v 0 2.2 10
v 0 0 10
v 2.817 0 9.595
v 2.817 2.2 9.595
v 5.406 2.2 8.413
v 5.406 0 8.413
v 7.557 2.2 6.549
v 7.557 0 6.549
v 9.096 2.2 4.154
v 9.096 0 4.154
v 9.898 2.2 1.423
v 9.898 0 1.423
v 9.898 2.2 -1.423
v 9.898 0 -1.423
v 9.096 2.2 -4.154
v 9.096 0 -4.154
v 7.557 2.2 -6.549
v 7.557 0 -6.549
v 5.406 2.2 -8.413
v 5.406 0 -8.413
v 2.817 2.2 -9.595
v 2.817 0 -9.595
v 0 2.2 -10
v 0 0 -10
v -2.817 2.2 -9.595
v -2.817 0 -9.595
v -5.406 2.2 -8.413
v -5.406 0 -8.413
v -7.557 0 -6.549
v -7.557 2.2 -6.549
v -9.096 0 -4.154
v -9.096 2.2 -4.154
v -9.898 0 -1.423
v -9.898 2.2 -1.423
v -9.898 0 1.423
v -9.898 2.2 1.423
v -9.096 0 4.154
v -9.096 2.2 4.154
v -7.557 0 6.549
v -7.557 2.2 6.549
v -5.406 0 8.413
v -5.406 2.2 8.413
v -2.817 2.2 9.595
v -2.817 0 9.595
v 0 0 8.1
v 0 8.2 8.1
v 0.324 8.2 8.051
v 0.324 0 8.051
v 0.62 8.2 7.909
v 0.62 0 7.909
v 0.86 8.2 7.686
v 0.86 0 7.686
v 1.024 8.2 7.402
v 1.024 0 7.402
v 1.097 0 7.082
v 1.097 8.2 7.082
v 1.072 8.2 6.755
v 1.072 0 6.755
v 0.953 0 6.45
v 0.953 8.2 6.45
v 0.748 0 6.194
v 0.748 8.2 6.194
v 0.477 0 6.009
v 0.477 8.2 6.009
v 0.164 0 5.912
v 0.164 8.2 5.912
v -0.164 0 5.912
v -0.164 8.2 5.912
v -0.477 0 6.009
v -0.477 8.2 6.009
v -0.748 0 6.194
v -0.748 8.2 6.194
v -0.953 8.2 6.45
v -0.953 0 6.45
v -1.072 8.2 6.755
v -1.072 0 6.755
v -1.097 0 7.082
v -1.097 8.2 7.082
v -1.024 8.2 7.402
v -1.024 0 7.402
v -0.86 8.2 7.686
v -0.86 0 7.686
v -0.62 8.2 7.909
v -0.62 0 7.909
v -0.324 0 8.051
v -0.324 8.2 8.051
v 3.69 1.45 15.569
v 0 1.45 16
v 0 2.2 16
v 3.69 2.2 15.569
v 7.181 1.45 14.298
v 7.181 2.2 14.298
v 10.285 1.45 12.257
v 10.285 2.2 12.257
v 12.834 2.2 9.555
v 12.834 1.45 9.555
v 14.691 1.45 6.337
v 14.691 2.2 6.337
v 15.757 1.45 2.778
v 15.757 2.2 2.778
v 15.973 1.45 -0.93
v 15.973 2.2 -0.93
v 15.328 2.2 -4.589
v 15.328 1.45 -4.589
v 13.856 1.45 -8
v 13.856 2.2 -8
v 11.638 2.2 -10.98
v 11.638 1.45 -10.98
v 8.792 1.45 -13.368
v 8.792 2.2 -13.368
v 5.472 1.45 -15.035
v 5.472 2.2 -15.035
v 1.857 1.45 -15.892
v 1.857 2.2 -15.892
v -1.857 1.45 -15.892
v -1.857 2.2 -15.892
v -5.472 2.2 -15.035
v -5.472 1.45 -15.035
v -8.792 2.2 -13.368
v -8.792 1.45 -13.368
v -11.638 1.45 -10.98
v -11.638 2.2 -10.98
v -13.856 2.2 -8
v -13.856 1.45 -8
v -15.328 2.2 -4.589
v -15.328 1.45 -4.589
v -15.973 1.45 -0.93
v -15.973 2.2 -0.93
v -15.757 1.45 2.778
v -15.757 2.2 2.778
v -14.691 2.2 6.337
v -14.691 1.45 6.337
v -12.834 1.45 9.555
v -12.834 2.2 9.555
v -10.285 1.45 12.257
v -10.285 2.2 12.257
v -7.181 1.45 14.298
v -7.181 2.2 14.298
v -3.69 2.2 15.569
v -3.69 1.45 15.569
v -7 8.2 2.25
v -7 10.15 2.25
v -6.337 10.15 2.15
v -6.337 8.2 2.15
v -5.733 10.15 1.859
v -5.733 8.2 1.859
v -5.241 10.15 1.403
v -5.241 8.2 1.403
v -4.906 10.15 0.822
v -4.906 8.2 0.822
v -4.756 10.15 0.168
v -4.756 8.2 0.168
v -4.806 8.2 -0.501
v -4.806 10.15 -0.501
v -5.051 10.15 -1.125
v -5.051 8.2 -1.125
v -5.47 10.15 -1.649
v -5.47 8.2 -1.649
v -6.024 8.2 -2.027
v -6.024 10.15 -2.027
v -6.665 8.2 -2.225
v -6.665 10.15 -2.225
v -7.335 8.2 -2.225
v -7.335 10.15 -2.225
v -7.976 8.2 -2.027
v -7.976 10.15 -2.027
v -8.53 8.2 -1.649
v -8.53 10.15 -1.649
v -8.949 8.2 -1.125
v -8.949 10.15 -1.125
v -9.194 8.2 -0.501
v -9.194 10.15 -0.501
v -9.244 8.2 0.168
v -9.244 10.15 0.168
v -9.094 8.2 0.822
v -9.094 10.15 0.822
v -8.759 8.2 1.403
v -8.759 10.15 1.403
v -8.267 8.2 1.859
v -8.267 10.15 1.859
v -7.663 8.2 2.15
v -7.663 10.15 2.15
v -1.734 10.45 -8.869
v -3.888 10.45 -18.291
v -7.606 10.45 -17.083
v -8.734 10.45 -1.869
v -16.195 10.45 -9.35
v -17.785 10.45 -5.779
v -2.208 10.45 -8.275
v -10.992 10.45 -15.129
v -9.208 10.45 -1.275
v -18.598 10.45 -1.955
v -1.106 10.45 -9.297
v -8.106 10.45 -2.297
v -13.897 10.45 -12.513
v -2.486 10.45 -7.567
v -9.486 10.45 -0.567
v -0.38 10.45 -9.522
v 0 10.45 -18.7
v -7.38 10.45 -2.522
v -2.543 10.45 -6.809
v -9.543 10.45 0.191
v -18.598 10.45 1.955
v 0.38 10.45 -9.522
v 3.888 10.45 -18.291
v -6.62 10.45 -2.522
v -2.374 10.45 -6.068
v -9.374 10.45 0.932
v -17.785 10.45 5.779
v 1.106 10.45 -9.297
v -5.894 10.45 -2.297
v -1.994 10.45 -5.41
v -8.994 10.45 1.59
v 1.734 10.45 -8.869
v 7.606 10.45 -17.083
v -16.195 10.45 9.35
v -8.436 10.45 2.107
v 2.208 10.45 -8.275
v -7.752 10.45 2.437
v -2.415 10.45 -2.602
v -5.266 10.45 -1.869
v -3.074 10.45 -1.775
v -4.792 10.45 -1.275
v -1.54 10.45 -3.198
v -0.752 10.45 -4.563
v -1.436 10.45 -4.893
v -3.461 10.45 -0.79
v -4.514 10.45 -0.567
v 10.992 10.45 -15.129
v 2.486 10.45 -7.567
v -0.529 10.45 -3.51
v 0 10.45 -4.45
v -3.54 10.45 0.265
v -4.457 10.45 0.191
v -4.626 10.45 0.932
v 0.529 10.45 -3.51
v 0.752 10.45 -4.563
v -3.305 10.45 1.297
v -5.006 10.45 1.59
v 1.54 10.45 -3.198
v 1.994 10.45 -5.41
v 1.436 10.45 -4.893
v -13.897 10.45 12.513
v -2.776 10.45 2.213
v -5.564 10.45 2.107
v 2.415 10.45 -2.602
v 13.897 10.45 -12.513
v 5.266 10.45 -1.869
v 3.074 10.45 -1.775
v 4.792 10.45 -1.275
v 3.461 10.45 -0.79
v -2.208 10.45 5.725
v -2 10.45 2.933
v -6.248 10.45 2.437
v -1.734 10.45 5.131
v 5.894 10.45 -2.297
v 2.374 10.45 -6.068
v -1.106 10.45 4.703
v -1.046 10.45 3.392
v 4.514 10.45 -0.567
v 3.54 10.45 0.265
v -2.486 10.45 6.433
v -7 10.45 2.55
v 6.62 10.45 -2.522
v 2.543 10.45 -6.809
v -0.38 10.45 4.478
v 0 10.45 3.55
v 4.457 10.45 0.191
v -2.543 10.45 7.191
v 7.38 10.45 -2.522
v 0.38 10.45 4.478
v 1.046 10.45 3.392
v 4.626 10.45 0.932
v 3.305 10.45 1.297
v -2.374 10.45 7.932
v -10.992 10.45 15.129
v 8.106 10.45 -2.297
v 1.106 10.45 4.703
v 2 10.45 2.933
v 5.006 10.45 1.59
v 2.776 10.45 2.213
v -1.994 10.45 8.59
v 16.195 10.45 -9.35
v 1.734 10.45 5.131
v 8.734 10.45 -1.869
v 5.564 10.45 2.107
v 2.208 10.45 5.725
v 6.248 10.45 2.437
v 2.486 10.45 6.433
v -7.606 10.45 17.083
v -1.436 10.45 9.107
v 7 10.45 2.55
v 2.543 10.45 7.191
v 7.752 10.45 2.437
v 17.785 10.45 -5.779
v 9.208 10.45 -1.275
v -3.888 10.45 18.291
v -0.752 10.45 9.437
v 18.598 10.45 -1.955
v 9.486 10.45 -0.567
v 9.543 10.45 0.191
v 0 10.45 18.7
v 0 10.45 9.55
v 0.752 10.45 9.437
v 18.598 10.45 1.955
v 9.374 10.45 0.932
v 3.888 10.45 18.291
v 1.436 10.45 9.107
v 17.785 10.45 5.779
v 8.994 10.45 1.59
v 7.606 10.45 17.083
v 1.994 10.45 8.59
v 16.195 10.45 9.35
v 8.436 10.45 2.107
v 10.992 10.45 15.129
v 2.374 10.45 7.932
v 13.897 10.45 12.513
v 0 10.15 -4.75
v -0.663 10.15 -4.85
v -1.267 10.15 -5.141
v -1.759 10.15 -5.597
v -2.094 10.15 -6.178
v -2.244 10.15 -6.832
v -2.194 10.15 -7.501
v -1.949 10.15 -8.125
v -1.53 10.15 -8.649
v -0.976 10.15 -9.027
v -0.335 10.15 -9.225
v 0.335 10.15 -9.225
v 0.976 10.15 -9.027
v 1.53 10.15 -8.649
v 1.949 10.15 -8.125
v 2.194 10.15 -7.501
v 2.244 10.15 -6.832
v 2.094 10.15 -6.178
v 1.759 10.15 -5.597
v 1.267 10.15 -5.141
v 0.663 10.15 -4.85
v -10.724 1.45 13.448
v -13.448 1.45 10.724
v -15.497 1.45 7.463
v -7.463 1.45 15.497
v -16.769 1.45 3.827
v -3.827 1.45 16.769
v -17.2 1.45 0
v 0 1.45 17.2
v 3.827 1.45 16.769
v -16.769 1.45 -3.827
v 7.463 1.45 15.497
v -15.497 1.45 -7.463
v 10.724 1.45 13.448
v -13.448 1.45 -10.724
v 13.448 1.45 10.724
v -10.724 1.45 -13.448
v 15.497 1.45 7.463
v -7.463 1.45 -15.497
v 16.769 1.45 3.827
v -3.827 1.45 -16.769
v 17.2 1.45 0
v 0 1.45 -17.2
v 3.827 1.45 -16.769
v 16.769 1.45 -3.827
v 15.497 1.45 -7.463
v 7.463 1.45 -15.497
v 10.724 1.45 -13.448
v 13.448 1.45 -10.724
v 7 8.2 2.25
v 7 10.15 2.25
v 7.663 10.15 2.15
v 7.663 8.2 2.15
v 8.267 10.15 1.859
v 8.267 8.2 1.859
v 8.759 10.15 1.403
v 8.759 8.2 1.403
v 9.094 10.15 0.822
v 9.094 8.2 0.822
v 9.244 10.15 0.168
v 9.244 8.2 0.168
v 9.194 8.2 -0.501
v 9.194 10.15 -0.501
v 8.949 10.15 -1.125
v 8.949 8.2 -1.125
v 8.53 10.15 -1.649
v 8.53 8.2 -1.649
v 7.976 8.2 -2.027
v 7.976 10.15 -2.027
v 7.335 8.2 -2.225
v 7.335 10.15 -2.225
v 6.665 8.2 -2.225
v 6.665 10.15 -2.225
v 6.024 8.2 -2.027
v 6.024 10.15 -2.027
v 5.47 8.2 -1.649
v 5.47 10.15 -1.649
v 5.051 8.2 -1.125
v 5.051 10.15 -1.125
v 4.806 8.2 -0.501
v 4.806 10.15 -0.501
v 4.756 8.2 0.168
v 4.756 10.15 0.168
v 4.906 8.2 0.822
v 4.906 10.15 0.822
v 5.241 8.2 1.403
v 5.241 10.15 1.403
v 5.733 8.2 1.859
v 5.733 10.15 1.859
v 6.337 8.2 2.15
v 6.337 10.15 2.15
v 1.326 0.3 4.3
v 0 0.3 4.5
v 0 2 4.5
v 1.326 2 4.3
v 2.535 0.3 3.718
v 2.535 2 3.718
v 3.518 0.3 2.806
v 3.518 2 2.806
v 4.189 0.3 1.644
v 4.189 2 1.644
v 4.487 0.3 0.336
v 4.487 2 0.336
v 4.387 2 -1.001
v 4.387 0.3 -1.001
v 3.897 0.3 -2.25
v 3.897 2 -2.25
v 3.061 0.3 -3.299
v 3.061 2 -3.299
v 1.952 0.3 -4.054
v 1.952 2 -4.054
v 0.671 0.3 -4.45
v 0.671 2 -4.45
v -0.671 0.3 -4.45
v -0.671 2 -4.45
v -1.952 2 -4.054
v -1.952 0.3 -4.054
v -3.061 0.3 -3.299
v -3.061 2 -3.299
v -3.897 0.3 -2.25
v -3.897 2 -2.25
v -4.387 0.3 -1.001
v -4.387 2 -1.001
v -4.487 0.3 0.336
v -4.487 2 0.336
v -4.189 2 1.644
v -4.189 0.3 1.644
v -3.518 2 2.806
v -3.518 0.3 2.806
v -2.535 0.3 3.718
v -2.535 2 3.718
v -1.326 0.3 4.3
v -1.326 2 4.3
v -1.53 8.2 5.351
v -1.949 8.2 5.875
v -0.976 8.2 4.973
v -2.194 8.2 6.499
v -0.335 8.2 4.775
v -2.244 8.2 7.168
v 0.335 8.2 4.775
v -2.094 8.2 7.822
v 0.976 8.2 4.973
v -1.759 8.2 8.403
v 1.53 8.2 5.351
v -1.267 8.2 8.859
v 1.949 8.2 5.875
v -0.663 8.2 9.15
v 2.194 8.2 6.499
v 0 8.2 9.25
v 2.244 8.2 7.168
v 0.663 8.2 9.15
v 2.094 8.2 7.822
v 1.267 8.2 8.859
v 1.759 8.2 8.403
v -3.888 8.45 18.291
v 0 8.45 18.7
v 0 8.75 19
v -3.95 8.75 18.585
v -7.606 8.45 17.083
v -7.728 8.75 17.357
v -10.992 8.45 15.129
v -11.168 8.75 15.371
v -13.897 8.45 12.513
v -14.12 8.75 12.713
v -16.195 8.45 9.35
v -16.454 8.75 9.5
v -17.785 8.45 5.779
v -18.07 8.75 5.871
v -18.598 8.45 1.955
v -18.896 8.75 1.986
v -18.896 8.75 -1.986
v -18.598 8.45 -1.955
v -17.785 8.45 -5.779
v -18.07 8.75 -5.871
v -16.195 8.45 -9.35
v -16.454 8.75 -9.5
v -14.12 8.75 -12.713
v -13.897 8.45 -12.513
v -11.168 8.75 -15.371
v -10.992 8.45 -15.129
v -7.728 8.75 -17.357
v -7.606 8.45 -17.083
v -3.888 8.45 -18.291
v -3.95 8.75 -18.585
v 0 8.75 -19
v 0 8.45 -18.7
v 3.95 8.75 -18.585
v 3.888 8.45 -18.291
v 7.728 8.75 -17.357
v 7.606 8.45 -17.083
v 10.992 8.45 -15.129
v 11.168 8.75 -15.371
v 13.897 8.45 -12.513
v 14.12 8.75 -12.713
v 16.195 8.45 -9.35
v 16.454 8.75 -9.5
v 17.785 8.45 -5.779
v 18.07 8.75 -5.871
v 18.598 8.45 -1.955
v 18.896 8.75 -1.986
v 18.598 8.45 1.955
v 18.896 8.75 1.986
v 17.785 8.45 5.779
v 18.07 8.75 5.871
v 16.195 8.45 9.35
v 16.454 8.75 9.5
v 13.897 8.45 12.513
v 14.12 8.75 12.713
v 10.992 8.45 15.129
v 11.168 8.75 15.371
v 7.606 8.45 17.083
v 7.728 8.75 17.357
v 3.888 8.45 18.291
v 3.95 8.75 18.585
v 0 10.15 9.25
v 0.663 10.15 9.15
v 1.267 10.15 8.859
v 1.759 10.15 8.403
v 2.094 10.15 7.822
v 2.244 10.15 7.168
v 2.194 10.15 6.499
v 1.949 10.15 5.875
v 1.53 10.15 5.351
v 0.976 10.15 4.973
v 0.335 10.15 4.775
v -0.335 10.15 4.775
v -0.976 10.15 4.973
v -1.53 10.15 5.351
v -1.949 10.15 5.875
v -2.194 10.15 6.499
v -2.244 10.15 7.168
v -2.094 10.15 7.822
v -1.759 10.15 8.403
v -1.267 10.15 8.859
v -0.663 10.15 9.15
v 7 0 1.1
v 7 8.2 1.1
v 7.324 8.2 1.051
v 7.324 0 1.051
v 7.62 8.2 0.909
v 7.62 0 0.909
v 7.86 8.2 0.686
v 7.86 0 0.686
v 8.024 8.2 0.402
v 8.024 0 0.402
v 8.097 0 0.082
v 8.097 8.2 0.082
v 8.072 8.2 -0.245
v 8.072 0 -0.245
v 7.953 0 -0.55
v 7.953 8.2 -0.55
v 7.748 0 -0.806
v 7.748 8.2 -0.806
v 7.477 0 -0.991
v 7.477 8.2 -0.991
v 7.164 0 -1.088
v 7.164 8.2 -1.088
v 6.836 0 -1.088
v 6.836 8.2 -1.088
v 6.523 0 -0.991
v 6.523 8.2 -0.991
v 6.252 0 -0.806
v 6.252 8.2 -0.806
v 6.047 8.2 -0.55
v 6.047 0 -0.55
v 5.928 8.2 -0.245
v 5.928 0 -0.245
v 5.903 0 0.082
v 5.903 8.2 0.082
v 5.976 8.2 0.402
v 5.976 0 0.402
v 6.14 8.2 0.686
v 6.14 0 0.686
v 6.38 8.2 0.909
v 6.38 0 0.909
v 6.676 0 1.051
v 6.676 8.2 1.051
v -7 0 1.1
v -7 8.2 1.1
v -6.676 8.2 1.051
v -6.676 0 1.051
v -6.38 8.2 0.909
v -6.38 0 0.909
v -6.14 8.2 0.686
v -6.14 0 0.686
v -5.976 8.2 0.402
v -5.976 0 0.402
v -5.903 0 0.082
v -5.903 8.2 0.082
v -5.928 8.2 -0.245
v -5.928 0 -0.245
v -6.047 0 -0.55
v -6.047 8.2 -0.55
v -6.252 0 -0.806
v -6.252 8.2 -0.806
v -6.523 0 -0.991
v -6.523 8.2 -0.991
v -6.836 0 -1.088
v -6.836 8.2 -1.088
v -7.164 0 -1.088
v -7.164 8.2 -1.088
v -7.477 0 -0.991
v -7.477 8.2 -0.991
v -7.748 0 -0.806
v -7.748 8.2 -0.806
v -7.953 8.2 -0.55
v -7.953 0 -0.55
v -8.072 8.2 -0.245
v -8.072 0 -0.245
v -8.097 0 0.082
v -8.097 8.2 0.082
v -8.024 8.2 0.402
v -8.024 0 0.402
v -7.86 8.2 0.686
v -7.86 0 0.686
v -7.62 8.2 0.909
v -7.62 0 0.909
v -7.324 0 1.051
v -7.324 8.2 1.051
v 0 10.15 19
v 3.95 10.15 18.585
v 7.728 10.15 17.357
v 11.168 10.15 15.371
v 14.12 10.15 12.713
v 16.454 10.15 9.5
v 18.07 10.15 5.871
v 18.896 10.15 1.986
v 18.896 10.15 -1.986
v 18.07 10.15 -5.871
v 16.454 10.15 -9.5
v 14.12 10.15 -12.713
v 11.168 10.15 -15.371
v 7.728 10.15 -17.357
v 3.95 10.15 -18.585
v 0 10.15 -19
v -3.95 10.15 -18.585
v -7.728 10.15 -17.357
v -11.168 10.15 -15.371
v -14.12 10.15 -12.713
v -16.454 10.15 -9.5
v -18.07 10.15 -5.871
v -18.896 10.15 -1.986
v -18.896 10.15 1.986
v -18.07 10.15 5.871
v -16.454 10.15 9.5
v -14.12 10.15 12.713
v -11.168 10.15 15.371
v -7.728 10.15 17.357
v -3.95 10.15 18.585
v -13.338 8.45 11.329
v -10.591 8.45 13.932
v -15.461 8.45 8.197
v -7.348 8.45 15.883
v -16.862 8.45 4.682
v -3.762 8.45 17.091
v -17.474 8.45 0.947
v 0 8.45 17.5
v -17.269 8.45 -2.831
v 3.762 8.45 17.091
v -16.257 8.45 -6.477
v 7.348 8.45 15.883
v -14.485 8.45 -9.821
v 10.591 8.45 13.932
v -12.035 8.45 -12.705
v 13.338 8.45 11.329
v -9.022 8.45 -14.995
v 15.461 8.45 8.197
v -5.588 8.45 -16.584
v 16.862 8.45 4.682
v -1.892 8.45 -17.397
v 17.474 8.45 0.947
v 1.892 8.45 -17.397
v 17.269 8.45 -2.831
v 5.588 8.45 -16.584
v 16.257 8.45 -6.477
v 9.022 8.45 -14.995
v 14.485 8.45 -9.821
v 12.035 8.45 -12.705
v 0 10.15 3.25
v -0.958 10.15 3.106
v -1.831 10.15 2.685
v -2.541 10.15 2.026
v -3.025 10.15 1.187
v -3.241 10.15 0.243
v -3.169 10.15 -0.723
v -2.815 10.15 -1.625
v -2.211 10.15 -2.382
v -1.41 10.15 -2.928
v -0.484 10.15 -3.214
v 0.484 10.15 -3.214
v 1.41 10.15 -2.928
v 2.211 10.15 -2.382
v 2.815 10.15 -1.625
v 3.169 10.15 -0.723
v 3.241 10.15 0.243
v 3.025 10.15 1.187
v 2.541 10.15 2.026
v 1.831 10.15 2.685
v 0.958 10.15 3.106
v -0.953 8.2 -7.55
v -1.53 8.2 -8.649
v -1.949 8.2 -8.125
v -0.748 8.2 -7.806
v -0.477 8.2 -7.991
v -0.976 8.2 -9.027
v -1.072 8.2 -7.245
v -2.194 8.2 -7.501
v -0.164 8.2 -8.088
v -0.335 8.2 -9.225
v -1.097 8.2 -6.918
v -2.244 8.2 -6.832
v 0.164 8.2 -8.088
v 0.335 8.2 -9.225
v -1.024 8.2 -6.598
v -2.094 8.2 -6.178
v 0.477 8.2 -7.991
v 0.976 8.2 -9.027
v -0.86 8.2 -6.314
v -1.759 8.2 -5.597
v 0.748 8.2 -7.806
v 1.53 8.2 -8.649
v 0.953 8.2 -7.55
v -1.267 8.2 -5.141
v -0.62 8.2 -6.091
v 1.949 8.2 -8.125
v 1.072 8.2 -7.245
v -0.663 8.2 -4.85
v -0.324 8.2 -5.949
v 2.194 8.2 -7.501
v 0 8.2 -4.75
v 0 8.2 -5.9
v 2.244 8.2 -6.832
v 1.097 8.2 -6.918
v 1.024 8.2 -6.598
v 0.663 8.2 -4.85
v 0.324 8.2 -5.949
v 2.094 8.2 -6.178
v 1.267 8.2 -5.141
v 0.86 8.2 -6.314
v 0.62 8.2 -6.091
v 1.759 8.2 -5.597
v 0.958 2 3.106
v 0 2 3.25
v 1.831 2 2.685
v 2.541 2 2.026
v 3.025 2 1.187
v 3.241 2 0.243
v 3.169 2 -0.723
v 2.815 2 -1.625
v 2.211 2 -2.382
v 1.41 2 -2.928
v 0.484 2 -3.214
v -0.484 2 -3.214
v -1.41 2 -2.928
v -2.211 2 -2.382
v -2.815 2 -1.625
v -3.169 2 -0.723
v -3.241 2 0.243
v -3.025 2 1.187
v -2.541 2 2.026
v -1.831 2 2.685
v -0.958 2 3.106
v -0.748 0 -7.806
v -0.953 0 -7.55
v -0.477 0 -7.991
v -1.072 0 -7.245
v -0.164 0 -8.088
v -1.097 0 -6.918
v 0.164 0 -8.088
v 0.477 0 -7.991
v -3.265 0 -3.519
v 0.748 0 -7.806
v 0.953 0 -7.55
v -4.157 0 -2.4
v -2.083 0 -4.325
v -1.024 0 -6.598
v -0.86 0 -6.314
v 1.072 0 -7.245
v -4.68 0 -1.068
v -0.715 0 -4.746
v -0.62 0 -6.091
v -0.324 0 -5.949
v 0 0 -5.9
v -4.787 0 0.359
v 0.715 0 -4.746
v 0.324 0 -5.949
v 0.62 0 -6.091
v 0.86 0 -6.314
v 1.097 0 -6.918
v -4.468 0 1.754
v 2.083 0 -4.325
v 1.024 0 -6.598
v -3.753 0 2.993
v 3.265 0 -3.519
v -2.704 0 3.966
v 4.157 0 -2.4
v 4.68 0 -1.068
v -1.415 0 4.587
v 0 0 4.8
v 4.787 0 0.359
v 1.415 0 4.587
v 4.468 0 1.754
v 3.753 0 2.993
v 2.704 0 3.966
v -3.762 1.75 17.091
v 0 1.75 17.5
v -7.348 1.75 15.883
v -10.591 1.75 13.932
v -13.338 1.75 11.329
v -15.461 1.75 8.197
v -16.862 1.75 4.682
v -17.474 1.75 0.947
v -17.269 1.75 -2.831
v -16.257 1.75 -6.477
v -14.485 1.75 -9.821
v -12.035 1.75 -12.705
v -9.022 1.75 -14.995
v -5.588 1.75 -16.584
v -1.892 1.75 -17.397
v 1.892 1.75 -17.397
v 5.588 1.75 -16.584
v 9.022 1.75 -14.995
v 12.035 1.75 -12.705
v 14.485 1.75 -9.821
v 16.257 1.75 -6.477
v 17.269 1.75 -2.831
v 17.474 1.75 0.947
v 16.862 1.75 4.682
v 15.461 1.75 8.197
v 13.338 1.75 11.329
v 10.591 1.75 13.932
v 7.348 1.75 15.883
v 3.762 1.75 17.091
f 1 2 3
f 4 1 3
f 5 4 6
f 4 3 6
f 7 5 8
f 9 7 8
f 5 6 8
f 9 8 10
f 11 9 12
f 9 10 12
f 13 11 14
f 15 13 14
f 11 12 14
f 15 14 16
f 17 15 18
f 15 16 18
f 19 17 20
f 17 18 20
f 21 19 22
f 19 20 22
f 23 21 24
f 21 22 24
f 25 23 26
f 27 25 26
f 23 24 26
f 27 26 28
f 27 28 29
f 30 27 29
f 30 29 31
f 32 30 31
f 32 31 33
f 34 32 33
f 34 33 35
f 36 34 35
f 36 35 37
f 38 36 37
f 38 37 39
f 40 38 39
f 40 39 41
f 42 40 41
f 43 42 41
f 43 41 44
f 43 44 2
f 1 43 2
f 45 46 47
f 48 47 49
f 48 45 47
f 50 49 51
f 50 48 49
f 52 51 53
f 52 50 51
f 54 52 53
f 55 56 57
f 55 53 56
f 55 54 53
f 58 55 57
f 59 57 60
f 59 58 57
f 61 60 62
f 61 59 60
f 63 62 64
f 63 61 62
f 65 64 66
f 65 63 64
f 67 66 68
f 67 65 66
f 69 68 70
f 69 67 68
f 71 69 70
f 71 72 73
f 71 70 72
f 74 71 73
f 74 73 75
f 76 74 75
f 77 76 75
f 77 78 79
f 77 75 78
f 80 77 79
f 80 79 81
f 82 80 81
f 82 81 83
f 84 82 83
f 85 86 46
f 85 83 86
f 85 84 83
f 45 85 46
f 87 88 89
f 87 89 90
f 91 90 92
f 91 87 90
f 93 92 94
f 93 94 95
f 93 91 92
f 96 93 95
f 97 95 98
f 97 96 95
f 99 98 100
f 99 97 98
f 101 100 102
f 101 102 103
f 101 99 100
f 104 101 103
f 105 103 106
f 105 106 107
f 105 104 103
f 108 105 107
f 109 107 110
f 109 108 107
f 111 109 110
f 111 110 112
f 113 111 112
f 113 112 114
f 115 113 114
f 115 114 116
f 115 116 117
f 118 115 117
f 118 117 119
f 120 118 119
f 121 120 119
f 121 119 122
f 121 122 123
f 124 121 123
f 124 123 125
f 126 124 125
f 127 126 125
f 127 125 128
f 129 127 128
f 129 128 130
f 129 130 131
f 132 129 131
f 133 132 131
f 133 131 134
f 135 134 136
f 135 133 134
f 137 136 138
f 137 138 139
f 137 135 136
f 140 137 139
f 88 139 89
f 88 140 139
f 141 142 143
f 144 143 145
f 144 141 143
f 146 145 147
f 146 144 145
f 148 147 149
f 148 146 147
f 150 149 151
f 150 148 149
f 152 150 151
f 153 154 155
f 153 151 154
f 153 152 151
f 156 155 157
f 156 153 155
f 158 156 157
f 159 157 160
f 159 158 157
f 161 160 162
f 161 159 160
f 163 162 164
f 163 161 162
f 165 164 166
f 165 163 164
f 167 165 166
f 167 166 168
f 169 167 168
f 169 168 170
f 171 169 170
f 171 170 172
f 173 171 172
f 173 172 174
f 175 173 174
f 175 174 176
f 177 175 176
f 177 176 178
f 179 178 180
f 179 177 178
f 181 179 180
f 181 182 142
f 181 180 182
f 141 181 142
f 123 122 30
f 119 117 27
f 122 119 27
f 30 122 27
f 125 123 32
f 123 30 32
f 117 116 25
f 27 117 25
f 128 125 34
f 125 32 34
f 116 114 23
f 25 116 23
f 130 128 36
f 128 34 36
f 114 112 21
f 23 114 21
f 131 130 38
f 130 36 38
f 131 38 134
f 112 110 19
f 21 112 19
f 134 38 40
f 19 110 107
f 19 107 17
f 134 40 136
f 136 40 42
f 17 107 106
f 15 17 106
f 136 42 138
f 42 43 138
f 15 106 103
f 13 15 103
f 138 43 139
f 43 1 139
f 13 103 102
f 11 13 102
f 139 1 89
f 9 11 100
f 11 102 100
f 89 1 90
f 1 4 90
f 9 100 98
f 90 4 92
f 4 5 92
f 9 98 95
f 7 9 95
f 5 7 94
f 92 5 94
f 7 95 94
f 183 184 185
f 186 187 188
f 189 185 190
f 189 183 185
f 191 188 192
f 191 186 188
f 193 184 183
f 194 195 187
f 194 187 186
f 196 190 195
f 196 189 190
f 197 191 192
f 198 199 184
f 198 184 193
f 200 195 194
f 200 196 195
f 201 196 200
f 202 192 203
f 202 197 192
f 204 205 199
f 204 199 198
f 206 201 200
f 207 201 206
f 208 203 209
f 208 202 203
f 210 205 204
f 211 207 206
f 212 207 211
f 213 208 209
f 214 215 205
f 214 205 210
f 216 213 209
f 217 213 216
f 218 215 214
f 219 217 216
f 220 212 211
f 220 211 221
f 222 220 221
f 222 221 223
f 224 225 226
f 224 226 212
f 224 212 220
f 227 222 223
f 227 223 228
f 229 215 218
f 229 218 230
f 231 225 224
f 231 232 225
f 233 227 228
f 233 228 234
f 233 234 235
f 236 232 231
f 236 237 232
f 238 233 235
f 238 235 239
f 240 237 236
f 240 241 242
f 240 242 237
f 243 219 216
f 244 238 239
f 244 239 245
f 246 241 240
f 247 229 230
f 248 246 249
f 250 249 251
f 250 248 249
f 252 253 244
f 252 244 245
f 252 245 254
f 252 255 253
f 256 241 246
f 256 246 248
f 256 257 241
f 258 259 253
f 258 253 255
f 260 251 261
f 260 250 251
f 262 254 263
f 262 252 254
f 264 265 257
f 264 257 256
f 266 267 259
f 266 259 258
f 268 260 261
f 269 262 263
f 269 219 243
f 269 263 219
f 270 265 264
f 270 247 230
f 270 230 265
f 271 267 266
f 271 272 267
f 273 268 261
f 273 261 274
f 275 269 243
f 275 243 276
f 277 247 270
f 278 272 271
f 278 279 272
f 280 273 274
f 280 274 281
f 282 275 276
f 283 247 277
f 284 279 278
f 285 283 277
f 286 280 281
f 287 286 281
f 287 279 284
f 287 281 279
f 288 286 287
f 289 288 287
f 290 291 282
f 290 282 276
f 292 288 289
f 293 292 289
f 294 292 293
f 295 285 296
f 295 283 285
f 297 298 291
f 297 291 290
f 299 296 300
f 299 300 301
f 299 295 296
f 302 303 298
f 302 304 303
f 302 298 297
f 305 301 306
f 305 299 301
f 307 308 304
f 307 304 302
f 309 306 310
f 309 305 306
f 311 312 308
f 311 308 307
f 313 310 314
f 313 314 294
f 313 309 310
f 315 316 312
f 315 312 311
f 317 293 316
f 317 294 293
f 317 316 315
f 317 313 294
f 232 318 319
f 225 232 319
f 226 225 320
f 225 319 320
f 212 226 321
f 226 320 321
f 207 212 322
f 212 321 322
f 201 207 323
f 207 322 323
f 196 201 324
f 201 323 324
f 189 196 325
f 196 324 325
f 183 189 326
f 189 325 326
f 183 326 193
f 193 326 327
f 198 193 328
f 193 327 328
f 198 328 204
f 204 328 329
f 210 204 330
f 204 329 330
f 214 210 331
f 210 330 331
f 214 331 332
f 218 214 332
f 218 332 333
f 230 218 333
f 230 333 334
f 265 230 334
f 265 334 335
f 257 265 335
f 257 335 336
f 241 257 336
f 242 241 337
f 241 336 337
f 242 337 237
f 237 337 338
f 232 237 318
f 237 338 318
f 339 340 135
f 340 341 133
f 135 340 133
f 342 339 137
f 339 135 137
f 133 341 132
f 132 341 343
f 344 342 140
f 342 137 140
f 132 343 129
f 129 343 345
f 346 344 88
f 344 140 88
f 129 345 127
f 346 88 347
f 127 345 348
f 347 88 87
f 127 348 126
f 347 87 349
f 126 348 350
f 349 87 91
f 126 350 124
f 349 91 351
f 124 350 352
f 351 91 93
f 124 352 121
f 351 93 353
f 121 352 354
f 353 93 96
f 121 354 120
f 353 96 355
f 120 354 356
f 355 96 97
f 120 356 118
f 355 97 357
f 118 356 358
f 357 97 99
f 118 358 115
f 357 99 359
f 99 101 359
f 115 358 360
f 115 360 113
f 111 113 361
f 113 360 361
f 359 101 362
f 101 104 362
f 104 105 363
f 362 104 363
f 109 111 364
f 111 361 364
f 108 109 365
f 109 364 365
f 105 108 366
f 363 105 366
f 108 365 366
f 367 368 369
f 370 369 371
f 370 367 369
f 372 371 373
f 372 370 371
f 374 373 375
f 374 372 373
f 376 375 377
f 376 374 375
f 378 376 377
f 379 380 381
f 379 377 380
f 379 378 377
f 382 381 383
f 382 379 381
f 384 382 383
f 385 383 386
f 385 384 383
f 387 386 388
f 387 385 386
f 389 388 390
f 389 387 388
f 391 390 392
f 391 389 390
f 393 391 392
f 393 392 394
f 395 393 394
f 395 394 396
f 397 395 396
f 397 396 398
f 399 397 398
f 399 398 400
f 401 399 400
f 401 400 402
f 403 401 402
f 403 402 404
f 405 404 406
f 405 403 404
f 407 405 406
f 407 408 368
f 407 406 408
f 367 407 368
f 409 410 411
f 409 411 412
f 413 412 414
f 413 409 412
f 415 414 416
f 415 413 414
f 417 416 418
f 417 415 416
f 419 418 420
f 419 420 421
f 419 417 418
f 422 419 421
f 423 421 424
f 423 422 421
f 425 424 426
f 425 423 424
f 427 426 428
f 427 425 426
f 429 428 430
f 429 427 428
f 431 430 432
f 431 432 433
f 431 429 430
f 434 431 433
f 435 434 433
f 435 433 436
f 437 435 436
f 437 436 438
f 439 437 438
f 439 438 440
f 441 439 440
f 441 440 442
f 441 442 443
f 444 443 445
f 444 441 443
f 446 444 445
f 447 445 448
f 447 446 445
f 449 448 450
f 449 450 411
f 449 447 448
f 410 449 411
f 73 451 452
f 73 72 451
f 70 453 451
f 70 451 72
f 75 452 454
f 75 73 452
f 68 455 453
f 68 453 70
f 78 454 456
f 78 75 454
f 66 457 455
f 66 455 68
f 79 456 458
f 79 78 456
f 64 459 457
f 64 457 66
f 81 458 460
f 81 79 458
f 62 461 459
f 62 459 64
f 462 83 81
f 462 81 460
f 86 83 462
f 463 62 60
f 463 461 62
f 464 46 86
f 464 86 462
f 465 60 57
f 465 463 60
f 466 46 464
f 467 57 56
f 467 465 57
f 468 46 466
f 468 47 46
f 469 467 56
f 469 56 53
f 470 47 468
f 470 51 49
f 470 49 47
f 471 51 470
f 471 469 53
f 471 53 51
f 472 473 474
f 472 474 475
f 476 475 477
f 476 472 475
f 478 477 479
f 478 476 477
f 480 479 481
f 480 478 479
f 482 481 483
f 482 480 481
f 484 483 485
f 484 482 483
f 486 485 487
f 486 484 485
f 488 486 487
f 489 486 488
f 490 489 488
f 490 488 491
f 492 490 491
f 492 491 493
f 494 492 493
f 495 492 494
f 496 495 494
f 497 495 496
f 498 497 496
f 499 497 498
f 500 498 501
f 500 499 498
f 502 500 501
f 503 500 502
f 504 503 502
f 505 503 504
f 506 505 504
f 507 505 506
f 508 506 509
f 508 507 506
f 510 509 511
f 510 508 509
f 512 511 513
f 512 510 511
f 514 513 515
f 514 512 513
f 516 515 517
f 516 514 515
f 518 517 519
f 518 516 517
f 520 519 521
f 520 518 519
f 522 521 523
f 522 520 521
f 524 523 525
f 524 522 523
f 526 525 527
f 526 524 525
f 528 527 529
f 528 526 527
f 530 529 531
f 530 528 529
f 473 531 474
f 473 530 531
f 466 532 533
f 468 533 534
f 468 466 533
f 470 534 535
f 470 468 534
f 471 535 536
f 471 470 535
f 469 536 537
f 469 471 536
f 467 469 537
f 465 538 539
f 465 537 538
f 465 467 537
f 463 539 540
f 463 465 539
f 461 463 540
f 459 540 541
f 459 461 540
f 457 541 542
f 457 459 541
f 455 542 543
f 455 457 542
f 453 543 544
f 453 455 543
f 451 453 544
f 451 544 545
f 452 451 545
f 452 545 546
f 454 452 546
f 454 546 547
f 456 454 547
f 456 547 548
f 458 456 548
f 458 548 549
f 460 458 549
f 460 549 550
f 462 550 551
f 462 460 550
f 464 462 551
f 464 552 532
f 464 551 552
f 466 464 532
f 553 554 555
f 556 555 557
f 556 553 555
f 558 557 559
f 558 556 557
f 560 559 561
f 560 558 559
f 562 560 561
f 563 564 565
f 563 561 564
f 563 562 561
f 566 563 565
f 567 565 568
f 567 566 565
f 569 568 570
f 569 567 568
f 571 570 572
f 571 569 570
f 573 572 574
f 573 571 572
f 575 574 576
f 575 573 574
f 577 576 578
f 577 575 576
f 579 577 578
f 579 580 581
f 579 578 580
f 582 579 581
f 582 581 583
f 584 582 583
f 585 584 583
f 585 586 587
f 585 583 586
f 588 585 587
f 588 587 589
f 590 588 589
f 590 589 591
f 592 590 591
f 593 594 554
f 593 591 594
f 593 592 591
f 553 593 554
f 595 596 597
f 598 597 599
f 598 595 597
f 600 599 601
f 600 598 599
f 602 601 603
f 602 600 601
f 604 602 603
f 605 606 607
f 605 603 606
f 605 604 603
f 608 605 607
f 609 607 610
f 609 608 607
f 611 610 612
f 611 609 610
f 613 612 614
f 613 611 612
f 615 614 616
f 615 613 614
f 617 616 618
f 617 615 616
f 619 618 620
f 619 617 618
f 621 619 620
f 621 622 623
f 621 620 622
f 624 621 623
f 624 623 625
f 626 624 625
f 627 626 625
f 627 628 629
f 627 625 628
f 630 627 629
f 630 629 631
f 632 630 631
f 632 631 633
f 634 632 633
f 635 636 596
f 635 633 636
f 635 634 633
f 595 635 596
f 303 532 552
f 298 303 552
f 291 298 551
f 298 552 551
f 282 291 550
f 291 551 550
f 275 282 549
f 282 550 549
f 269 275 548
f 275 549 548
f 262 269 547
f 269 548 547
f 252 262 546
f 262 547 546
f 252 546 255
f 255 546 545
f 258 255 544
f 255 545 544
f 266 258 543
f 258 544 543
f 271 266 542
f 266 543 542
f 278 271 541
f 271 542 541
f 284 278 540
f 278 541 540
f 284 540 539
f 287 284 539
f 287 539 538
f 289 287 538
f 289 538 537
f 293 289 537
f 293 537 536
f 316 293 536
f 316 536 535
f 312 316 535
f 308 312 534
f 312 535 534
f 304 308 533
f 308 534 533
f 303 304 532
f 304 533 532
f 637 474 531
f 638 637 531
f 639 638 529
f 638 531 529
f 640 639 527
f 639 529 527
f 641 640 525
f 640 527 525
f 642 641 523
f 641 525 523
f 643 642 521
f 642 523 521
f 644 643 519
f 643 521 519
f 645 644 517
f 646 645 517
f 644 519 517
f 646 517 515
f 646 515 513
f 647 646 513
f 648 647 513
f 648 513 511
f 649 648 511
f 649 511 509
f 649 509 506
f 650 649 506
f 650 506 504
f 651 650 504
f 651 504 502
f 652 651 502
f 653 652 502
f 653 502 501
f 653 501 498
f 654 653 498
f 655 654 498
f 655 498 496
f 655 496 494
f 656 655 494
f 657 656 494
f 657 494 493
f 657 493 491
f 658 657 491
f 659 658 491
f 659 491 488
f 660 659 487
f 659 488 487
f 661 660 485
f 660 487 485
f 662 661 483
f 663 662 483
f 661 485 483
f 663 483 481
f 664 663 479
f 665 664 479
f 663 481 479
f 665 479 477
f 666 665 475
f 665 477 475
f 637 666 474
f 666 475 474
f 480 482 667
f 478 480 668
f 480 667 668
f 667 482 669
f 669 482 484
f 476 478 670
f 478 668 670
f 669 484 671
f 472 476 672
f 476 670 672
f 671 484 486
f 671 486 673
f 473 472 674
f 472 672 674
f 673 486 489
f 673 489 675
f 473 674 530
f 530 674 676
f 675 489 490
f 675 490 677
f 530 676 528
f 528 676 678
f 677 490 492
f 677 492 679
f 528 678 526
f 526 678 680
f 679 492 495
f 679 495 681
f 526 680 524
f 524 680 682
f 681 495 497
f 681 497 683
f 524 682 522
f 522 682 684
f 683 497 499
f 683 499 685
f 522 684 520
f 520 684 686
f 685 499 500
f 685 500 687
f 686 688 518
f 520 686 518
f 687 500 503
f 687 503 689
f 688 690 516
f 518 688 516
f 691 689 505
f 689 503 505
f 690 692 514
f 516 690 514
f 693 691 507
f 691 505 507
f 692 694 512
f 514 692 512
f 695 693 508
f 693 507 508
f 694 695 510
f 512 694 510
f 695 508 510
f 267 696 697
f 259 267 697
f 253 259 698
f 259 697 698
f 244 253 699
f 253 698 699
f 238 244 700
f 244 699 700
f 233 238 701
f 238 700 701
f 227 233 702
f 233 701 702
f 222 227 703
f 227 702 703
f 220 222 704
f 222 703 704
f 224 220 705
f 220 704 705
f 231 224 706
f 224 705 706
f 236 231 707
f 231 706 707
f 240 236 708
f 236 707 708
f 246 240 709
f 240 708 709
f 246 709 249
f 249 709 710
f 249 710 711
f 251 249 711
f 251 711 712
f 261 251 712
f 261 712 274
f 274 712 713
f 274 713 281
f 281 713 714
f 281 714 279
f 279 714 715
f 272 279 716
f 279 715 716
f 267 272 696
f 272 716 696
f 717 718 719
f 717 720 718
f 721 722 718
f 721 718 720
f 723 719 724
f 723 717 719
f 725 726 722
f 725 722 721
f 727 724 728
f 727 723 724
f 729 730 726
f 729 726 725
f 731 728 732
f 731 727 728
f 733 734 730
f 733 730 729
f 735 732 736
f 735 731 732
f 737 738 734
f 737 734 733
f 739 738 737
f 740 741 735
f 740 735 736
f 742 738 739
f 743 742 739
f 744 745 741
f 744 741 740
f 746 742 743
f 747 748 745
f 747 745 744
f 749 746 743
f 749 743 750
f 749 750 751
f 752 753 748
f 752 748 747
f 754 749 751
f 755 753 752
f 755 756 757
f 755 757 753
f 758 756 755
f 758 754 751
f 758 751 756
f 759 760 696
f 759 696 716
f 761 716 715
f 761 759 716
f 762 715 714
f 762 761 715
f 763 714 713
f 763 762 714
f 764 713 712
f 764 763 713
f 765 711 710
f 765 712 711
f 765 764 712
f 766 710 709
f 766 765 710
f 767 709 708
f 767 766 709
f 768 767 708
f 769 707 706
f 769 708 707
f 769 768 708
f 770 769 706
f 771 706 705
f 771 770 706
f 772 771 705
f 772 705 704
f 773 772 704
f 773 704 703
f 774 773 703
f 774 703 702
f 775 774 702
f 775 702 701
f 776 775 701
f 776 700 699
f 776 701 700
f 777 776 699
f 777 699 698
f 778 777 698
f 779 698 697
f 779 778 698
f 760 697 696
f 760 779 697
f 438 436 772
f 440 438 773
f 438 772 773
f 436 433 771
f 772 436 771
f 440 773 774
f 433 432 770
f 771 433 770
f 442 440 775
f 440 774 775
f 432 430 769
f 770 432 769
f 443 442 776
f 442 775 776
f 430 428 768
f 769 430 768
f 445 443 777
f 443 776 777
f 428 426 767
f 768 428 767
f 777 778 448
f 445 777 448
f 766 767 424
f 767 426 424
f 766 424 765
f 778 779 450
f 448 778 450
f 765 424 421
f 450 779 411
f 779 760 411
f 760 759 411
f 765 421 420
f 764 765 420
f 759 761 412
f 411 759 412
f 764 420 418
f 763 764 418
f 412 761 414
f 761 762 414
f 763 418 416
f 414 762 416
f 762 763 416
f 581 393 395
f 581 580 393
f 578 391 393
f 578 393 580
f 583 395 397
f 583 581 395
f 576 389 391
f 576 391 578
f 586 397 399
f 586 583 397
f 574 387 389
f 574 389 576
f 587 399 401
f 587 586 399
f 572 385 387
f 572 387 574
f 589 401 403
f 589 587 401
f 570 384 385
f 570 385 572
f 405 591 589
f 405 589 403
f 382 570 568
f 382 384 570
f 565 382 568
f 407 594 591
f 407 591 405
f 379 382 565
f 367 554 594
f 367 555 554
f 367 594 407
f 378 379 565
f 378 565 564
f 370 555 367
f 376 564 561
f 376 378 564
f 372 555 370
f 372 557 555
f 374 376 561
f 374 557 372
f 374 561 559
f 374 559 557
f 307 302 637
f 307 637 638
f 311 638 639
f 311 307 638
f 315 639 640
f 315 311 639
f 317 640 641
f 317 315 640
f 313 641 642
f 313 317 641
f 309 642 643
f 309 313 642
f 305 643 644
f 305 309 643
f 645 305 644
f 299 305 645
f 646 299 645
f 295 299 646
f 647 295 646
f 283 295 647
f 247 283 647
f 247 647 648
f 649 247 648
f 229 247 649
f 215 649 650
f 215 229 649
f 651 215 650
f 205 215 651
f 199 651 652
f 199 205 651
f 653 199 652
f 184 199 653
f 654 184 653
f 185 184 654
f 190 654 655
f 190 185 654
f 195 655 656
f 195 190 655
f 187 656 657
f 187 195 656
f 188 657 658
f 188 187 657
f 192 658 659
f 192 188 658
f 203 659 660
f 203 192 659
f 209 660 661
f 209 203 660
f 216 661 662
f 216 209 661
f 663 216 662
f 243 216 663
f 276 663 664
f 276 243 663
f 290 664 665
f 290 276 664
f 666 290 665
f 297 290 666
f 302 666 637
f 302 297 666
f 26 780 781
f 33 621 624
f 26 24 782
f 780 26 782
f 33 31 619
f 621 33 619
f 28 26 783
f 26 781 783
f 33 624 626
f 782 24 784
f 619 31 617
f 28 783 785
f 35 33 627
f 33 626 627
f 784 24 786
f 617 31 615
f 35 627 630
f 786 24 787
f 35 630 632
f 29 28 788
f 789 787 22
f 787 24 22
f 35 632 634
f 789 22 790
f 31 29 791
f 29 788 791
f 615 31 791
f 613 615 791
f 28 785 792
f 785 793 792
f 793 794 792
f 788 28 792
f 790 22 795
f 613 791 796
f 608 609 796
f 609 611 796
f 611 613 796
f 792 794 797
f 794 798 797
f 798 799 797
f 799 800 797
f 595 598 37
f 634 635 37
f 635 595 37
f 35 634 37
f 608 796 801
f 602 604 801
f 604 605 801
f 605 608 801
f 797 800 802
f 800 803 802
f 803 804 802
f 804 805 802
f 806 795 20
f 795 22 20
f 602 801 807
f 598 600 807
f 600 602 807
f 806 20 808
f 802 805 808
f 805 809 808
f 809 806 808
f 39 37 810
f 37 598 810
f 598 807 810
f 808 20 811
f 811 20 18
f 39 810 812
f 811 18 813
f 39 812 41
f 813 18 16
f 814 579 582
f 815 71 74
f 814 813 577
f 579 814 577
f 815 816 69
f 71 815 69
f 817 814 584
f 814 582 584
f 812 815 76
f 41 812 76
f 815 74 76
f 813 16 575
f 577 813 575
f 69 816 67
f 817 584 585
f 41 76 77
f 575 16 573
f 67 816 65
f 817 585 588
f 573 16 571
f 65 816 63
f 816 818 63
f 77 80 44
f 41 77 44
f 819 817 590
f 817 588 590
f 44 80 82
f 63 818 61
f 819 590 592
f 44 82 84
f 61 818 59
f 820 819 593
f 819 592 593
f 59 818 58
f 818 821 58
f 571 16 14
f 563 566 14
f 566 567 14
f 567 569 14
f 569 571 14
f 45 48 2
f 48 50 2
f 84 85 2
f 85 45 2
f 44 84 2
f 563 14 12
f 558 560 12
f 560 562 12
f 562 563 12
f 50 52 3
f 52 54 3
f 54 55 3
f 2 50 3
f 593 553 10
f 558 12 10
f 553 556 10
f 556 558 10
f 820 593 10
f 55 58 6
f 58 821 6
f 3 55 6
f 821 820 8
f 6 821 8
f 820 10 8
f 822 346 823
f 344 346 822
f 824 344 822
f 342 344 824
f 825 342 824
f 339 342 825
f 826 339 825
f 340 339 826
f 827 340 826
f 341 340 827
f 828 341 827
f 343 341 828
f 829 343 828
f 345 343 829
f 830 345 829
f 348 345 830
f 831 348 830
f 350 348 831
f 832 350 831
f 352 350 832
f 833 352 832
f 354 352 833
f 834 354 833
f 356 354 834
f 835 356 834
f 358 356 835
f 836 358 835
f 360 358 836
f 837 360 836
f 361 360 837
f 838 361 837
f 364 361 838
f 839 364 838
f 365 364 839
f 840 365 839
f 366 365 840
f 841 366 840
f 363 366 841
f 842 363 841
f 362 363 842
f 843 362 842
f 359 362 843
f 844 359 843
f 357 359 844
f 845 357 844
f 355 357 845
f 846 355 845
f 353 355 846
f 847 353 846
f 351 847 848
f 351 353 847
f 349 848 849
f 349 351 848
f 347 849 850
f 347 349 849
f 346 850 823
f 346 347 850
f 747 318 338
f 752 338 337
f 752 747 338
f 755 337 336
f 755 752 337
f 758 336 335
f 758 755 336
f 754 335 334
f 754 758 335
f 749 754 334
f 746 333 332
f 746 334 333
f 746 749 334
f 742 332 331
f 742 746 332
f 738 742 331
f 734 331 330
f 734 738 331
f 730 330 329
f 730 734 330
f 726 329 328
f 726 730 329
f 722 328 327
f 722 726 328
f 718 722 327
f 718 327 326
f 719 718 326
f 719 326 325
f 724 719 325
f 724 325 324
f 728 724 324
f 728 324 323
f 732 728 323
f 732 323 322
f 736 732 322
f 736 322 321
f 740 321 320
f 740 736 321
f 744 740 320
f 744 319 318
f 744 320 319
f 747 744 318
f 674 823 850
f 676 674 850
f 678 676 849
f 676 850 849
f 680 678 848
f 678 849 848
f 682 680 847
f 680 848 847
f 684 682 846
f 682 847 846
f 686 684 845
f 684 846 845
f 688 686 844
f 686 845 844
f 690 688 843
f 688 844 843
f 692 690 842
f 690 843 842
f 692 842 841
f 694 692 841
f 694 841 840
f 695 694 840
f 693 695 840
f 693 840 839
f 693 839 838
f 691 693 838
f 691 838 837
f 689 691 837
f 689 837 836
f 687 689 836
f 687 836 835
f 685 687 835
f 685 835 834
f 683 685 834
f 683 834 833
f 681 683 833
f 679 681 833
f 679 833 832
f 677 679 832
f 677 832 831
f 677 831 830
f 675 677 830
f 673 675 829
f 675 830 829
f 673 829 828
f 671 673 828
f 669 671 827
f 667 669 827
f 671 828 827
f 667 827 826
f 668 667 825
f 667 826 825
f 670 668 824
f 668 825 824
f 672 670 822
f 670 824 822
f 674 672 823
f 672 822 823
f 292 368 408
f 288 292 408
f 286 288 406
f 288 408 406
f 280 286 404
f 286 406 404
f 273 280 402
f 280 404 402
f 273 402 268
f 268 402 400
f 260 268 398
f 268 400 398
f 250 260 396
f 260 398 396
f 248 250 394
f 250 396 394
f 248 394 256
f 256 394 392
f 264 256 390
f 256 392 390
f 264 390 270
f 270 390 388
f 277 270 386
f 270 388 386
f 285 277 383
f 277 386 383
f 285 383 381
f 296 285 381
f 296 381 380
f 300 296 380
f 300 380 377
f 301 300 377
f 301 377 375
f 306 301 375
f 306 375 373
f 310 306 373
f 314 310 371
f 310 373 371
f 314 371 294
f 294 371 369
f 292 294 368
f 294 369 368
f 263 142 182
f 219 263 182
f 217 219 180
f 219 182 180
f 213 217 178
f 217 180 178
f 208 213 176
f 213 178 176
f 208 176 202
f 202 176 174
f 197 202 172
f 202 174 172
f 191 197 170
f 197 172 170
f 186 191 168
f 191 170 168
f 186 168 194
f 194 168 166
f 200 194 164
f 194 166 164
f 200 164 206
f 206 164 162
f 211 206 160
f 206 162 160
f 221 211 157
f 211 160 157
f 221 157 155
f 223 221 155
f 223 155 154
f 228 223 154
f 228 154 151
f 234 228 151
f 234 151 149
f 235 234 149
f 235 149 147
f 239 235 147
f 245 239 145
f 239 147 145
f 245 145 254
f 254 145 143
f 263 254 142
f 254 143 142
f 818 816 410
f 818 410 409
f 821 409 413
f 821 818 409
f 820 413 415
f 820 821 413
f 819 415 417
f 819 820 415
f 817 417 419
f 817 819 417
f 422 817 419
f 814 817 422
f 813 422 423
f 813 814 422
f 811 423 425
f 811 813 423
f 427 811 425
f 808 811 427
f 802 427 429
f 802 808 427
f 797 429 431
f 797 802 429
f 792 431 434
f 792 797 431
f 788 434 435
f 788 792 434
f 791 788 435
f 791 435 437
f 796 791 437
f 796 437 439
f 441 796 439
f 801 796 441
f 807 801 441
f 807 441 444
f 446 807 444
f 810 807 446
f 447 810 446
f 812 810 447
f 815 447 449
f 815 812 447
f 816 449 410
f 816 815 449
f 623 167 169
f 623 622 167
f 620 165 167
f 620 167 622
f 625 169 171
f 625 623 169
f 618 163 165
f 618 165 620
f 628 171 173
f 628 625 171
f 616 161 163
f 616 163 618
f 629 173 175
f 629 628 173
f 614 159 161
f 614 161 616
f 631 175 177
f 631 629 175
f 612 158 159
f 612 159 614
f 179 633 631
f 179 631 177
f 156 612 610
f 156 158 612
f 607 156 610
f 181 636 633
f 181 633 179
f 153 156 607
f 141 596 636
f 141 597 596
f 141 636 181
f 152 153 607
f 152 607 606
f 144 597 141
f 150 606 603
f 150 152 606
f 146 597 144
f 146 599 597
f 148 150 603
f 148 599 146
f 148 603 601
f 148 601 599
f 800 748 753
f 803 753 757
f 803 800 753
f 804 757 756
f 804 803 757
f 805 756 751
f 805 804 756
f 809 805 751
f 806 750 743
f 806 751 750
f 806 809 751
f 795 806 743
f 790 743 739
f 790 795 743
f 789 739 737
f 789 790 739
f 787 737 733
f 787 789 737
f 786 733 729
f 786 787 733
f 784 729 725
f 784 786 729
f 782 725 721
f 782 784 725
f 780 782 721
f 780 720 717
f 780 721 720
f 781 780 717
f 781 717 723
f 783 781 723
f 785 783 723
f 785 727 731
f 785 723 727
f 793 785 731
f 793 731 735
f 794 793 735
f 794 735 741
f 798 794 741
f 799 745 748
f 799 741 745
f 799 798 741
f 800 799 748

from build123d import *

# Parameters (mm, degrees)
SKETCH_1_R          = 19
EXTRUDE_1_DEPTH     = 10.45
SKETCH_2_R          = 35.878367213
SKETCH_2_R_2        = 10
CUT_EXTRUDE_1_DEPTH = 1.45
SKETCH_2_3_R        = 35.878367213
SKETCH_2_3_R_2      = 17.5
CUT_EXTRUDE_2_DEPTH = 8.45
SKETCH_3_R          = 3.25
SKETCH_3_R_2        = 1.1
CUT_EXTRUDE_3_DEPTH = 29.83058272
CUT_EXTRUDE_START   = 8.2
SKETCH_3_3_R        = 2.25
CUT_EXTRUDE_4_DEPTH = 21.63058272
SKETCH_4_R          = 16
SKETCH_4_R_2        = 10
CUT_EXTRUDE_5_DEPTH = 2.2
SKETCH_5_R          = 4.5
CUT_EXTRUDE_6_DEPTH = 2
CHAMFER_1_SIZE      = 0.3


with BuildPart() as part:
    # Эскиз1 → Бобышка-Вытянуть1 (new body)
    with BuildSketch(Plane(origin=(0, 0, 0), x_dir=(1, 0, 0), z_dir=(0, 1, 0))):
        Circle(SKETCH_1_R)
    extrude(amount=EXTRUDE_1_DEPTH)

    # Эскиз2 → Вырез-Вытянуть1 (cut)
    with BuildSketch(Plane(origin=(0, 0, 0), x_dir=(1, 0, 0), z_dir=(0, 1, 0))):
        Circle(SKETCH_2_R)
        Circle(SKETCH_2_R_2, mode=Mode.SUBTRACT)
    extrude(amount=CUT_EXTRUDE_1_DEPTH, mode=Mode.SUBTRACT)

    # Эскиз2<3> → Вырез-Вытянуть2 (cut)
    with BuildSketch(Plane(origin=(0, 0, 0), x_dir=(1, 0, 0), z_dir=(0, 1, 0))):
        Circle(SKETCH_2_3_R)
        Circle(SKETCH_2_3_R_2, mode=Mode.SUBTRACT)
    extrude(amount=CUT_EXTRUDE_2_DEPTH, mode=Mode.SUBTRACT)

    # Эскиз3 → Вырез-Вытянуть3 (cut, through all)
    with BuildSketch(Plane(origin=(0, 0, 0), x_dir=(1, 0, 0), z_dir=(0, 1, 0))):
        Circle(SKETCH_3_R)
        with Locations((0, 7)):
            Circle(SKETCH_3_R_2)
        with Locations((-7, 0)):
            Circle(SKETCH_3_R_2)
        with Locations((0, -7)):
            Circle(SKETCH_3_R_2)
        with Locations((7, 0)):
            Circle(SKETCH_3_R_2)
    extrude(amount=CUT_EXTRUDE_3_DEPTH, mode=Mode.SUBTRACT)

    # Эскиз3<3> → Вырез-Вытянуть4 (cut, through all)
    with BuildSketch(Plane(origin=(0, 0, 0), x_dir=(1, 0, 0), z_dir=(0, 1, 0)).offset(CUT_EXTRUDE_START)):
        with Locations((0, 7)):
            Circle(SKETCH_3_3_R)
        with Locations((7, 0)):
            Circle(SKETCH_3_3_R)
        with Locations((0, -7)):
            Circle(SKETCH_3_3_R)
        with Locations((-7, 0)):
            Circle(SKETCH_3_3_R)
    extrude(amount=CUT_EXTRUDE_4_DEPTH, mode=Mode.SUBTRACT)

    # Эскиз4 → Вырез-Вытянуть5 (cut)
    with BuildSketch(Plane(origin=(0, 0, 0), x_dir=(1, 0, 0), z_dir=(0, 1, 0))):
        Circle(SKETCH_4_R)
        Circle(SKETCH_4_R_2, mode=Mode.SUBTRACT)
    extrude(amount=CUT_EXTRUDE_5_DEPTH, mode=Mode.SUBTRACT)

    # Эскиз5 → Вырез-Вытянуть6 (cut)
    with BuildSketch(Plane(origin=(0, 0, 0), x_dir=(1, 0, 0), z_dir=(0, 1, 0))):
        Circle(SKETCH_5_R)
    extrude(amount=CUT_EXTRUDE_6_DEPTH, mode=Mode.SUBTRACT)

    # Фаска1
    chamfer_1_edges = [part.edges().sort_by_distance(p)[0] for p in [
        (-19, 10.45, 0),
        (-3.25, 10.45, 0),
        (-2.25, 10.45, 7),
        (4.75, 10.45, 0),
        (-2.25, 10.45, -7),
        (-9.25, 10.45, 0),
        (-17.5, 1.45, 0),
        (-19, 8.45, 0),
        (-4.5, 0, 0),
    ]]
    chamfer(chamfer_1_edges, length=CHAMFER_1_SIZE)


solid = part.part
